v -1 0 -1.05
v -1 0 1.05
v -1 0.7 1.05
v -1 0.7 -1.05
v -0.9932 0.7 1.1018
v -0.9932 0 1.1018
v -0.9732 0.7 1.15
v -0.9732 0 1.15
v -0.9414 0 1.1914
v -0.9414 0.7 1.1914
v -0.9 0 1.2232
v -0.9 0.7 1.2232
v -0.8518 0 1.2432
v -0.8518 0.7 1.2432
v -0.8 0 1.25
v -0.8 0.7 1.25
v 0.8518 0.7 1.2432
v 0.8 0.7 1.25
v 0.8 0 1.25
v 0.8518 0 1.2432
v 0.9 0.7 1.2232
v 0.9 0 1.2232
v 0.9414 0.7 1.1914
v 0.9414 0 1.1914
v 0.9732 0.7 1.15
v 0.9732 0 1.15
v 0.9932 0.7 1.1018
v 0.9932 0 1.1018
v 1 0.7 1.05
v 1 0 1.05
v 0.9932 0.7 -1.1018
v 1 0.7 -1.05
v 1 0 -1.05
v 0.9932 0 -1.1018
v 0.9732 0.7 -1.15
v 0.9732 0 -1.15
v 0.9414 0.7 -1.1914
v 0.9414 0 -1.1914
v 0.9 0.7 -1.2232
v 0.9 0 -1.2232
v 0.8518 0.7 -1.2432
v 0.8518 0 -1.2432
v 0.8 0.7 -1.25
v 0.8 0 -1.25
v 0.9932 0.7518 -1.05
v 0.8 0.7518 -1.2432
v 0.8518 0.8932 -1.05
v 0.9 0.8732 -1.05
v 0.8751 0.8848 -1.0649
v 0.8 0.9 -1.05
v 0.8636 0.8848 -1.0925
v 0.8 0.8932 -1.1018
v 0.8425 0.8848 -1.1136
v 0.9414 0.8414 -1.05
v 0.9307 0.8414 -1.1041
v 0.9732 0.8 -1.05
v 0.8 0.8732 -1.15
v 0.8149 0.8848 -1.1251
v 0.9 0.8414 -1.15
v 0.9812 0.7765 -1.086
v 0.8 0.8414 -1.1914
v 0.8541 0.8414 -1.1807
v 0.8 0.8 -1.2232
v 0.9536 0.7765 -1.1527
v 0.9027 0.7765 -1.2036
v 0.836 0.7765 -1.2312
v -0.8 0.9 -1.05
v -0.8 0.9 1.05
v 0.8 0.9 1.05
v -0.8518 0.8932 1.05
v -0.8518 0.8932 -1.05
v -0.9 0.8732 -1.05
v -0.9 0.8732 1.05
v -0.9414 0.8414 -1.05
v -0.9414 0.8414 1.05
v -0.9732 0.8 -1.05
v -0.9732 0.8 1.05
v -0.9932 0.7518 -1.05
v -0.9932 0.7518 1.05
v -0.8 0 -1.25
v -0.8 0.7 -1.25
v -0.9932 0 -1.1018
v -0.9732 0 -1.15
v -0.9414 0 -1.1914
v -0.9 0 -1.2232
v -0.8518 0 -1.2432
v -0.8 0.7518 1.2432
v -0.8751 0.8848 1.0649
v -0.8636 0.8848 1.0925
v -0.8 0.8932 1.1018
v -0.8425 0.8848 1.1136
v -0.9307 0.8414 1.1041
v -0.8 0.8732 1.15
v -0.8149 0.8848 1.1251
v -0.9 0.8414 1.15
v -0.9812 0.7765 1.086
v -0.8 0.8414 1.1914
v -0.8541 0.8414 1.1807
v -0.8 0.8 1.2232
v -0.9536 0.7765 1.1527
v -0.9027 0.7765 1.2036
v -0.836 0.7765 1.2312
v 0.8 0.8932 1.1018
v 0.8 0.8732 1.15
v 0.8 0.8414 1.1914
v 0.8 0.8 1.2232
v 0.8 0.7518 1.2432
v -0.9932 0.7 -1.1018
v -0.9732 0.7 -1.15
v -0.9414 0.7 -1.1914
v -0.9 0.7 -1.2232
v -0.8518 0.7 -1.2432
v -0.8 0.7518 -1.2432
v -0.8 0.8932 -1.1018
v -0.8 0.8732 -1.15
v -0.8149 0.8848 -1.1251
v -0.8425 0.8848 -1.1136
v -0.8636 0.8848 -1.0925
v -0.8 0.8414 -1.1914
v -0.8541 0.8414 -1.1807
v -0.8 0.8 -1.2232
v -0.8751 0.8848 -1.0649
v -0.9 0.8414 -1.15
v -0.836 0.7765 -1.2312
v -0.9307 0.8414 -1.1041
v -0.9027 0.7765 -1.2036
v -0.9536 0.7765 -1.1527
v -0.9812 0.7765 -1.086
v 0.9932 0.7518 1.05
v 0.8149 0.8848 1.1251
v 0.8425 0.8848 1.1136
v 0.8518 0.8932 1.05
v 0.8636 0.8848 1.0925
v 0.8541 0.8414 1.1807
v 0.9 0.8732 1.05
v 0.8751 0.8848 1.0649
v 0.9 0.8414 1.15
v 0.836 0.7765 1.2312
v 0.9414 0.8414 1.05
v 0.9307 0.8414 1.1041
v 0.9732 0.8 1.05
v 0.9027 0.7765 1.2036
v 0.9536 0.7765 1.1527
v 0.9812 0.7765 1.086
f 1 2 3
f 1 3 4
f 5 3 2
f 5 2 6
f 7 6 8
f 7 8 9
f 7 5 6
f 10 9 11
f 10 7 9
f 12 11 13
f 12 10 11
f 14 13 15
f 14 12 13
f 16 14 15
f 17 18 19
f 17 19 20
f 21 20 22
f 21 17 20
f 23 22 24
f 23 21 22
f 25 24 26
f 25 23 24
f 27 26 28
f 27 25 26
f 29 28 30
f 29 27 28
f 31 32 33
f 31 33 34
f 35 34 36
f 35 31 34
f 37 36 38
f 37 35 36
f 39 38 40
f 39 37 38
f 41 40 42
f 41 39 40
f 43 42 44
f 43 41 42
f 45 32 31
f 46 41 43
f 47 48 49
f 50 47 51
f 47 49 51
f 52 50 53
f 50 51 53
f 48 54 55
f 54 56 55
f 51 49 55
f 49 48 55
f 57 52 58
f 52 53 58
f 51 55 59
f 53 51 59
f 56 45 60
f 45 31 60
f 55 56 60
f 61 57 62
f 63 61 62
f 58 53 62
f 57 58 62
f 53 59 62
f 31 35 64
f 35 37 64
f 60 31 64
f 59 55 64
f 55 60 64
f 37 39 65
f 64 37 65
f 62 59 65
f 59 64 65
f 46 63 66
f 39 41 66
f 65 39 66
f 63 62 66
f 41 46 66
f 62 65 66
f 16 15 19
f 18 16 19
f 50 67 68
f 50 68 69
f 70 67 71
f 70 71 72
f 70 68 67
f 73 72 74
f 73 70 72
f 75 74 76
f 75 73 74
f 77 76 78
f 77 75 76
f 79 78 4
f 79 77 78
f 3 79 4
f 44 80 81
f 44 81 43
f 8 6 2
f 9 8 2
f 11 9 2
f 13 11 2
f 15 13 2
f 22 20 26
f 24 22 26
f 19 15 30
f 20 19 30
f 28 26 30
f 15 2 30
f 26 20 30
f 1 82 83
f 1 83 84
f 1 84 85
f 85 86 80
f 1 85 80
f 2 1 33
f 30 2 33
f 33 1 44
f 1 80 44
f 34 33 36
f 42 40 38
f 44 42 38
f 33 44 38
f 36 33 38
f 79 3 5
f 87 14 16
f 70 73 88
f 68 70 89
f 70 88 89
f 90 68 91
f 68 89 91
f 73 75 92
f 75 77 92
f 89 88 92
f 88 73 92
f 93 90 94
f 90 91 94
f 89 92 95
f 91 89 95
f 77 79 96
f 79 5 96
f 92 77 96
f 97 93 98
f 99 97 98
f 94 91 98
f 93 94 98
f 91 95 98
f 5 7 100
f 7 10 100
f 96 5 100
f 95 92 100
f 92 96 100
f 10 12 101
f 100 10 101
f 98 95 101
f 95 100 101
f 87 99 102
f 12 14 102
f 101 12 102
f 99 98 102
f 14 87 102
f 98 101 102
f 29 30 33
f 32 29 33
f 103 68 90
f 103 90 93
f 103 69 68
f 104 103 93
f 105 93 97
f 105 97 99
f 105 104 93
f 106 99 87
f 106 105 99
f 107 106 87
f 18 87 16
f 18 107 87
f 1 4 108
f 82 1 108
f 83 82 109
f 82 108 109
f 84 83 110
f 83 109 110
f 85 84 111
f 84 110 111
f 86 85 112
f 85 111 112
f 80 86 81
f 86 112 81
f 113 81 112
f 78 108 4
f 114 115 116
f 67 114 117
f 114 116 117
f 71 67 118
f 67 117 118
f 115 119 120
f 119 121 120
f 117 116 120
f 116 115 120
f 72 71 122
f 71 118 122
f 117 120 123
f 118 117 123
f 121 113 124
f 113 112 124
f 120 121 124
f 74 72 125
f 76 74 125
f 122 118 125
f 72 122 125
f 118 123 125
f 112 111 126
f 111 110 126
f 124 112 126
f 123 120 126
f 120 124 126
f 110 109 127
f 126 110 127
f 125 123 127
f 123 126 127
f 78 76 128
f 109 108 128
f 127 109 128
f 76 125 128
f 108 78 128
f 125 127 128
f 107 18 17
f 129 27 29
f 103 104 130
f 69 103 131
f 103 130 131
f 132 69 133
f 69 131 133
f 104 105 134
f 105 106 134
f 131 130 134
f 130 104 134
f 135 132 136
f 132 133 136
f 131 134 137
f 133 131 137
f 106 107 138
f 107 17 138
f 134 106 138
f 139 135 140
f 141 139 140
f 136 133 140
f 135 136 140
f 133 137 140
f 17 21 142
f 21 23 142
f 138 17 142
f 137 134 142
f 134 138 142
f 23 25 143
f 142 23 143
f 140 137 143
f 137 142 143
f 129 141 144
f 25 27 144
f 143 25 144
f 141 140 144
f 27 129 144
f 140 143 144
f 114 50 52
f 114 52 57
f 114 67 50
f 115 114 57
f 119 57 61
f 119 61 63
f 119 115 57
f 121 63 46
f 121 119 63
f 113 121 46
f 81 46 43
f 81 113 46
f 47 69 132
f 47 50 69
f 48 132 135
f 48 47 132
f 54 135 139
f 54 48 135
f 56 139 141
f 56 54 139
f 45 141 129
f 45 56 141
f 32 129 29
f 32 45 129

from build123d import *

# Parameters (mm, degrees)
BASES_W    = 2
BASES_H    = 2.5
BASE_DEPTH = 0.9
SIDEF_R    = 0.2
TOPF_R     = 0.2


with BuildPart() as part:
    # BaseS → Base (new body)
    with BuildSketch(Plane(origin=(0, 0, 0), x_dir=(1, 0, 0), z_dir=(0, 1, 0))):
        Rectangle(BASES_W, BASES_H)
    extrude(amount=BASE_DEPTH)

    # SideF
    sidef_edges = [part.edges().sort_by_distance(p)[0] for p in [
        (1, 0.45, 1.25),
        (-1, 0.45, 1.25),
        (-1, 0.45, -1.25),
        (1, 0.45, -1.25),
    ]]
    fillet(sidef_edges, radius=SIDEF_R)

    # TopF
    topf_edges = [part.edges().sort_by_distance(p)[0] for p in [
        (1, 0.9, 0),
        (0, 0.9, 1.25),
        (0, 0.9, -1.25),
        (-1, 0.9, 0),
        (-0.941421356, 0.9, -1.191421356),
        (-0.941421356, 0.9, 1.191421356),
        (0.941421356, 0.9, -1.191421356),
        (0.941421356, 0.9, 1.191421356),
    ]]
    fillet(topf_edges, radius=TOPF_R)


solid = part.part
